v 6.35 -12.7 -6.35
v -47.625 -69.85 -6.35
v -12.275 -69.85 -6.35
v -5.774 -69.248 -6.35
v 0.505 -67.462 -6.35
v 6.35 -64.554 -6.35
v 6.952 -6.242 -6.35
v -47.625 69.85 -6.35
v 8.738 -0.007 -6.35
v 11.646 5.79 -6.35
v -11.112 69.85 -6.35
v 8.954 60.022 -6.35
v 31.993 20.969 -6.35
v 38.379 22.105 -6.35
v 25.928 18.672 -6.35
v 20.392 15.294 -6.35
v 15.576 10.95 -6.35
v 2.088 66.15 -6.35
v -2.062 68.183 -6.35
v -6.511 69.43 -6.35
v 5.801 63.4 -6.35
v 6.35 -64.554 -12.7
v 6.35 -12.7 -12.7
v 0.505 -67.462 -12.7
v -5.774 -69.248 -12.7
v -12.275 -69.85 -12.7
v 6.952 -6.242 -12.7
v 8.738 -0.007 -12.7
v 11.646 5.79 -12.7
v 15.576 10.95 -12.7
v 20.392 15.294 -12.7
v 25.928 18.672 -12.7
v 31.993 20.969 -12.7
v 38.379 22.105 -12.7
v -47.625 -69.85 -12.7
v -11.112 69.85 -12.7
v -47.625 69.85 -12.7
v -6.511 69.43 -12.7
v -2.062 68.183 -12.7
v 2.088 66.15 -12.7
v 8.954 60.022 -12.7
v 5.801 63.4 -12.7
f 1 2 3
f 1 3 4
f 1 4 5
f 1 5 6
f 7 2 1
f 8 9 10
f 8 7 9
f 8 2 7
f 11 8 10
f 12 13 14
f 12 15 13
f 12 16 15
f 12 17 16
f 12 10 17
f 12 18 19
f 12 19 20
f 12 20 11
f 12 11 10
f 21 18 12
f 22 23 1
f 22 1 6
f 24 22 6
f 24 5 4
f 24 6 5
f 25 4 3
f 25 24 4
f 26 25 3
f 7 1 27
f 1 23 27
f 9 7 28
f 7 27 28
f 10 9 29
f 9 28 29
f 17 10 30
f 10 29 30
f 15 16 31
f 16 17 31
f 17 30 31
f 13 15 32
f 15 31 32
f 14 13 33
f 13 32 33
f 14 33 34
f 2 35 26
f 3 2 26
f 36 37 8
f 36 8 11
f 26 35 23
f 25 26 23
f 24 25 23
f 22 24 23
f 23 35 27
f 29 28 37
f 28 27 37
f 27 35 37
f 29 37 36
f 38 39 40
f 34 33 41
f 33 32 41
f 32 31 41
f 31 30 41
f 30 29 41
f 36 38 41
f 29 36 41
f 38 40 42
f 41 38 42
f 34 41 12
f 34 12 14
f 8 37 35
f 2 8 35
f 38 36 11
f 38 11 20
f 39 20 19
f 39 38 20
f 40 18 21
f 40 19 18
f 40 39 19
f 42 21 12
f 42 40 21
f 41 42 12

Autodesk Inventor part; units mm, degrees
ref_plane "YZ Plane" through (0, 0, 0) normal (1, 0, 0) x (0, 1, 0)
ref_plane "XZ Plane" through (0, 0, 0) normal (0, 1, 0) x (-1, 0, 0)
ref_plane "Work Plane1" through (0, 0, -12.7) normal (0, 0, 1) x (1, 0, 0)
sketch "Sketch1" plane through (0, 0, -12.7) normal (0, 0, 1) x (1, 0, 0)
  line L0 (-47.625, 69.85) -> (-11.1125, 69.85)
  arc A0 (8.9541, 60.0222) -> (-11.1125, 69.85) centre (-11.1125, 44.45) ccw
  line L1 (8.9541, 60.0222) -> (38.3789, 22.1047)
  line L2 (-47.625, 69.85) -> (-47.625, -69.85)
  line L3 (-47.625, -69.85) -> (-12.2749, -69.85)
  arc A1 (-12.2749, -69.85) -> (9.777, -62.1413) centre (-12.2749, -34.4543) ccw
  line L4 (9.777, -62.1413) -> (30.2464, -45.838)
  arc A2 (38.3789, 22.1047) -> (30.2464, -45.838) centre (41.275, -12.7) ccw
  line L5 (56.3249, -1.0209) -> (8.9541, 60.0222) construction
  line L6 (-11.1125, 69.85) -> (-60.325, 69.85) construction
  line L7 (-60.325, -69.85) -> (-12.2749, -69.85) construction
  line L8 (9.777, -62.1413) -> (53.1434, -27.6012) construction
  circle A3 centre (41.275, -12.7) radius 9.525 construction
  line L9 (-60.325, 69.85) -> (-60.325, -69.85) construction
  circle A4 centre (-11.1125, 44.45) radius 10
  line L10 (6.35, -12.7) -> (6.35, -64.8708)
  line L11 (41.275, 22.225) -> (38.2856, 22.225)
  point P0 (0, 0)
  point P1 (16.8552, -56.5037)
  point P2 (38.2856, 22.225)
  point P3 (6.35, -64.5536)
  dimension "d0" = 12.7
  dimension "d1" = 34.925
  dimension "d4" = 20
extrude "Extrusion1" add sketch "Sketch1" along normal blind 6.35 contours L0 A0 L1 A2 L10 A1 L3 L2 | A4
properties part number "baseInner" material "Aluminum 6061"
